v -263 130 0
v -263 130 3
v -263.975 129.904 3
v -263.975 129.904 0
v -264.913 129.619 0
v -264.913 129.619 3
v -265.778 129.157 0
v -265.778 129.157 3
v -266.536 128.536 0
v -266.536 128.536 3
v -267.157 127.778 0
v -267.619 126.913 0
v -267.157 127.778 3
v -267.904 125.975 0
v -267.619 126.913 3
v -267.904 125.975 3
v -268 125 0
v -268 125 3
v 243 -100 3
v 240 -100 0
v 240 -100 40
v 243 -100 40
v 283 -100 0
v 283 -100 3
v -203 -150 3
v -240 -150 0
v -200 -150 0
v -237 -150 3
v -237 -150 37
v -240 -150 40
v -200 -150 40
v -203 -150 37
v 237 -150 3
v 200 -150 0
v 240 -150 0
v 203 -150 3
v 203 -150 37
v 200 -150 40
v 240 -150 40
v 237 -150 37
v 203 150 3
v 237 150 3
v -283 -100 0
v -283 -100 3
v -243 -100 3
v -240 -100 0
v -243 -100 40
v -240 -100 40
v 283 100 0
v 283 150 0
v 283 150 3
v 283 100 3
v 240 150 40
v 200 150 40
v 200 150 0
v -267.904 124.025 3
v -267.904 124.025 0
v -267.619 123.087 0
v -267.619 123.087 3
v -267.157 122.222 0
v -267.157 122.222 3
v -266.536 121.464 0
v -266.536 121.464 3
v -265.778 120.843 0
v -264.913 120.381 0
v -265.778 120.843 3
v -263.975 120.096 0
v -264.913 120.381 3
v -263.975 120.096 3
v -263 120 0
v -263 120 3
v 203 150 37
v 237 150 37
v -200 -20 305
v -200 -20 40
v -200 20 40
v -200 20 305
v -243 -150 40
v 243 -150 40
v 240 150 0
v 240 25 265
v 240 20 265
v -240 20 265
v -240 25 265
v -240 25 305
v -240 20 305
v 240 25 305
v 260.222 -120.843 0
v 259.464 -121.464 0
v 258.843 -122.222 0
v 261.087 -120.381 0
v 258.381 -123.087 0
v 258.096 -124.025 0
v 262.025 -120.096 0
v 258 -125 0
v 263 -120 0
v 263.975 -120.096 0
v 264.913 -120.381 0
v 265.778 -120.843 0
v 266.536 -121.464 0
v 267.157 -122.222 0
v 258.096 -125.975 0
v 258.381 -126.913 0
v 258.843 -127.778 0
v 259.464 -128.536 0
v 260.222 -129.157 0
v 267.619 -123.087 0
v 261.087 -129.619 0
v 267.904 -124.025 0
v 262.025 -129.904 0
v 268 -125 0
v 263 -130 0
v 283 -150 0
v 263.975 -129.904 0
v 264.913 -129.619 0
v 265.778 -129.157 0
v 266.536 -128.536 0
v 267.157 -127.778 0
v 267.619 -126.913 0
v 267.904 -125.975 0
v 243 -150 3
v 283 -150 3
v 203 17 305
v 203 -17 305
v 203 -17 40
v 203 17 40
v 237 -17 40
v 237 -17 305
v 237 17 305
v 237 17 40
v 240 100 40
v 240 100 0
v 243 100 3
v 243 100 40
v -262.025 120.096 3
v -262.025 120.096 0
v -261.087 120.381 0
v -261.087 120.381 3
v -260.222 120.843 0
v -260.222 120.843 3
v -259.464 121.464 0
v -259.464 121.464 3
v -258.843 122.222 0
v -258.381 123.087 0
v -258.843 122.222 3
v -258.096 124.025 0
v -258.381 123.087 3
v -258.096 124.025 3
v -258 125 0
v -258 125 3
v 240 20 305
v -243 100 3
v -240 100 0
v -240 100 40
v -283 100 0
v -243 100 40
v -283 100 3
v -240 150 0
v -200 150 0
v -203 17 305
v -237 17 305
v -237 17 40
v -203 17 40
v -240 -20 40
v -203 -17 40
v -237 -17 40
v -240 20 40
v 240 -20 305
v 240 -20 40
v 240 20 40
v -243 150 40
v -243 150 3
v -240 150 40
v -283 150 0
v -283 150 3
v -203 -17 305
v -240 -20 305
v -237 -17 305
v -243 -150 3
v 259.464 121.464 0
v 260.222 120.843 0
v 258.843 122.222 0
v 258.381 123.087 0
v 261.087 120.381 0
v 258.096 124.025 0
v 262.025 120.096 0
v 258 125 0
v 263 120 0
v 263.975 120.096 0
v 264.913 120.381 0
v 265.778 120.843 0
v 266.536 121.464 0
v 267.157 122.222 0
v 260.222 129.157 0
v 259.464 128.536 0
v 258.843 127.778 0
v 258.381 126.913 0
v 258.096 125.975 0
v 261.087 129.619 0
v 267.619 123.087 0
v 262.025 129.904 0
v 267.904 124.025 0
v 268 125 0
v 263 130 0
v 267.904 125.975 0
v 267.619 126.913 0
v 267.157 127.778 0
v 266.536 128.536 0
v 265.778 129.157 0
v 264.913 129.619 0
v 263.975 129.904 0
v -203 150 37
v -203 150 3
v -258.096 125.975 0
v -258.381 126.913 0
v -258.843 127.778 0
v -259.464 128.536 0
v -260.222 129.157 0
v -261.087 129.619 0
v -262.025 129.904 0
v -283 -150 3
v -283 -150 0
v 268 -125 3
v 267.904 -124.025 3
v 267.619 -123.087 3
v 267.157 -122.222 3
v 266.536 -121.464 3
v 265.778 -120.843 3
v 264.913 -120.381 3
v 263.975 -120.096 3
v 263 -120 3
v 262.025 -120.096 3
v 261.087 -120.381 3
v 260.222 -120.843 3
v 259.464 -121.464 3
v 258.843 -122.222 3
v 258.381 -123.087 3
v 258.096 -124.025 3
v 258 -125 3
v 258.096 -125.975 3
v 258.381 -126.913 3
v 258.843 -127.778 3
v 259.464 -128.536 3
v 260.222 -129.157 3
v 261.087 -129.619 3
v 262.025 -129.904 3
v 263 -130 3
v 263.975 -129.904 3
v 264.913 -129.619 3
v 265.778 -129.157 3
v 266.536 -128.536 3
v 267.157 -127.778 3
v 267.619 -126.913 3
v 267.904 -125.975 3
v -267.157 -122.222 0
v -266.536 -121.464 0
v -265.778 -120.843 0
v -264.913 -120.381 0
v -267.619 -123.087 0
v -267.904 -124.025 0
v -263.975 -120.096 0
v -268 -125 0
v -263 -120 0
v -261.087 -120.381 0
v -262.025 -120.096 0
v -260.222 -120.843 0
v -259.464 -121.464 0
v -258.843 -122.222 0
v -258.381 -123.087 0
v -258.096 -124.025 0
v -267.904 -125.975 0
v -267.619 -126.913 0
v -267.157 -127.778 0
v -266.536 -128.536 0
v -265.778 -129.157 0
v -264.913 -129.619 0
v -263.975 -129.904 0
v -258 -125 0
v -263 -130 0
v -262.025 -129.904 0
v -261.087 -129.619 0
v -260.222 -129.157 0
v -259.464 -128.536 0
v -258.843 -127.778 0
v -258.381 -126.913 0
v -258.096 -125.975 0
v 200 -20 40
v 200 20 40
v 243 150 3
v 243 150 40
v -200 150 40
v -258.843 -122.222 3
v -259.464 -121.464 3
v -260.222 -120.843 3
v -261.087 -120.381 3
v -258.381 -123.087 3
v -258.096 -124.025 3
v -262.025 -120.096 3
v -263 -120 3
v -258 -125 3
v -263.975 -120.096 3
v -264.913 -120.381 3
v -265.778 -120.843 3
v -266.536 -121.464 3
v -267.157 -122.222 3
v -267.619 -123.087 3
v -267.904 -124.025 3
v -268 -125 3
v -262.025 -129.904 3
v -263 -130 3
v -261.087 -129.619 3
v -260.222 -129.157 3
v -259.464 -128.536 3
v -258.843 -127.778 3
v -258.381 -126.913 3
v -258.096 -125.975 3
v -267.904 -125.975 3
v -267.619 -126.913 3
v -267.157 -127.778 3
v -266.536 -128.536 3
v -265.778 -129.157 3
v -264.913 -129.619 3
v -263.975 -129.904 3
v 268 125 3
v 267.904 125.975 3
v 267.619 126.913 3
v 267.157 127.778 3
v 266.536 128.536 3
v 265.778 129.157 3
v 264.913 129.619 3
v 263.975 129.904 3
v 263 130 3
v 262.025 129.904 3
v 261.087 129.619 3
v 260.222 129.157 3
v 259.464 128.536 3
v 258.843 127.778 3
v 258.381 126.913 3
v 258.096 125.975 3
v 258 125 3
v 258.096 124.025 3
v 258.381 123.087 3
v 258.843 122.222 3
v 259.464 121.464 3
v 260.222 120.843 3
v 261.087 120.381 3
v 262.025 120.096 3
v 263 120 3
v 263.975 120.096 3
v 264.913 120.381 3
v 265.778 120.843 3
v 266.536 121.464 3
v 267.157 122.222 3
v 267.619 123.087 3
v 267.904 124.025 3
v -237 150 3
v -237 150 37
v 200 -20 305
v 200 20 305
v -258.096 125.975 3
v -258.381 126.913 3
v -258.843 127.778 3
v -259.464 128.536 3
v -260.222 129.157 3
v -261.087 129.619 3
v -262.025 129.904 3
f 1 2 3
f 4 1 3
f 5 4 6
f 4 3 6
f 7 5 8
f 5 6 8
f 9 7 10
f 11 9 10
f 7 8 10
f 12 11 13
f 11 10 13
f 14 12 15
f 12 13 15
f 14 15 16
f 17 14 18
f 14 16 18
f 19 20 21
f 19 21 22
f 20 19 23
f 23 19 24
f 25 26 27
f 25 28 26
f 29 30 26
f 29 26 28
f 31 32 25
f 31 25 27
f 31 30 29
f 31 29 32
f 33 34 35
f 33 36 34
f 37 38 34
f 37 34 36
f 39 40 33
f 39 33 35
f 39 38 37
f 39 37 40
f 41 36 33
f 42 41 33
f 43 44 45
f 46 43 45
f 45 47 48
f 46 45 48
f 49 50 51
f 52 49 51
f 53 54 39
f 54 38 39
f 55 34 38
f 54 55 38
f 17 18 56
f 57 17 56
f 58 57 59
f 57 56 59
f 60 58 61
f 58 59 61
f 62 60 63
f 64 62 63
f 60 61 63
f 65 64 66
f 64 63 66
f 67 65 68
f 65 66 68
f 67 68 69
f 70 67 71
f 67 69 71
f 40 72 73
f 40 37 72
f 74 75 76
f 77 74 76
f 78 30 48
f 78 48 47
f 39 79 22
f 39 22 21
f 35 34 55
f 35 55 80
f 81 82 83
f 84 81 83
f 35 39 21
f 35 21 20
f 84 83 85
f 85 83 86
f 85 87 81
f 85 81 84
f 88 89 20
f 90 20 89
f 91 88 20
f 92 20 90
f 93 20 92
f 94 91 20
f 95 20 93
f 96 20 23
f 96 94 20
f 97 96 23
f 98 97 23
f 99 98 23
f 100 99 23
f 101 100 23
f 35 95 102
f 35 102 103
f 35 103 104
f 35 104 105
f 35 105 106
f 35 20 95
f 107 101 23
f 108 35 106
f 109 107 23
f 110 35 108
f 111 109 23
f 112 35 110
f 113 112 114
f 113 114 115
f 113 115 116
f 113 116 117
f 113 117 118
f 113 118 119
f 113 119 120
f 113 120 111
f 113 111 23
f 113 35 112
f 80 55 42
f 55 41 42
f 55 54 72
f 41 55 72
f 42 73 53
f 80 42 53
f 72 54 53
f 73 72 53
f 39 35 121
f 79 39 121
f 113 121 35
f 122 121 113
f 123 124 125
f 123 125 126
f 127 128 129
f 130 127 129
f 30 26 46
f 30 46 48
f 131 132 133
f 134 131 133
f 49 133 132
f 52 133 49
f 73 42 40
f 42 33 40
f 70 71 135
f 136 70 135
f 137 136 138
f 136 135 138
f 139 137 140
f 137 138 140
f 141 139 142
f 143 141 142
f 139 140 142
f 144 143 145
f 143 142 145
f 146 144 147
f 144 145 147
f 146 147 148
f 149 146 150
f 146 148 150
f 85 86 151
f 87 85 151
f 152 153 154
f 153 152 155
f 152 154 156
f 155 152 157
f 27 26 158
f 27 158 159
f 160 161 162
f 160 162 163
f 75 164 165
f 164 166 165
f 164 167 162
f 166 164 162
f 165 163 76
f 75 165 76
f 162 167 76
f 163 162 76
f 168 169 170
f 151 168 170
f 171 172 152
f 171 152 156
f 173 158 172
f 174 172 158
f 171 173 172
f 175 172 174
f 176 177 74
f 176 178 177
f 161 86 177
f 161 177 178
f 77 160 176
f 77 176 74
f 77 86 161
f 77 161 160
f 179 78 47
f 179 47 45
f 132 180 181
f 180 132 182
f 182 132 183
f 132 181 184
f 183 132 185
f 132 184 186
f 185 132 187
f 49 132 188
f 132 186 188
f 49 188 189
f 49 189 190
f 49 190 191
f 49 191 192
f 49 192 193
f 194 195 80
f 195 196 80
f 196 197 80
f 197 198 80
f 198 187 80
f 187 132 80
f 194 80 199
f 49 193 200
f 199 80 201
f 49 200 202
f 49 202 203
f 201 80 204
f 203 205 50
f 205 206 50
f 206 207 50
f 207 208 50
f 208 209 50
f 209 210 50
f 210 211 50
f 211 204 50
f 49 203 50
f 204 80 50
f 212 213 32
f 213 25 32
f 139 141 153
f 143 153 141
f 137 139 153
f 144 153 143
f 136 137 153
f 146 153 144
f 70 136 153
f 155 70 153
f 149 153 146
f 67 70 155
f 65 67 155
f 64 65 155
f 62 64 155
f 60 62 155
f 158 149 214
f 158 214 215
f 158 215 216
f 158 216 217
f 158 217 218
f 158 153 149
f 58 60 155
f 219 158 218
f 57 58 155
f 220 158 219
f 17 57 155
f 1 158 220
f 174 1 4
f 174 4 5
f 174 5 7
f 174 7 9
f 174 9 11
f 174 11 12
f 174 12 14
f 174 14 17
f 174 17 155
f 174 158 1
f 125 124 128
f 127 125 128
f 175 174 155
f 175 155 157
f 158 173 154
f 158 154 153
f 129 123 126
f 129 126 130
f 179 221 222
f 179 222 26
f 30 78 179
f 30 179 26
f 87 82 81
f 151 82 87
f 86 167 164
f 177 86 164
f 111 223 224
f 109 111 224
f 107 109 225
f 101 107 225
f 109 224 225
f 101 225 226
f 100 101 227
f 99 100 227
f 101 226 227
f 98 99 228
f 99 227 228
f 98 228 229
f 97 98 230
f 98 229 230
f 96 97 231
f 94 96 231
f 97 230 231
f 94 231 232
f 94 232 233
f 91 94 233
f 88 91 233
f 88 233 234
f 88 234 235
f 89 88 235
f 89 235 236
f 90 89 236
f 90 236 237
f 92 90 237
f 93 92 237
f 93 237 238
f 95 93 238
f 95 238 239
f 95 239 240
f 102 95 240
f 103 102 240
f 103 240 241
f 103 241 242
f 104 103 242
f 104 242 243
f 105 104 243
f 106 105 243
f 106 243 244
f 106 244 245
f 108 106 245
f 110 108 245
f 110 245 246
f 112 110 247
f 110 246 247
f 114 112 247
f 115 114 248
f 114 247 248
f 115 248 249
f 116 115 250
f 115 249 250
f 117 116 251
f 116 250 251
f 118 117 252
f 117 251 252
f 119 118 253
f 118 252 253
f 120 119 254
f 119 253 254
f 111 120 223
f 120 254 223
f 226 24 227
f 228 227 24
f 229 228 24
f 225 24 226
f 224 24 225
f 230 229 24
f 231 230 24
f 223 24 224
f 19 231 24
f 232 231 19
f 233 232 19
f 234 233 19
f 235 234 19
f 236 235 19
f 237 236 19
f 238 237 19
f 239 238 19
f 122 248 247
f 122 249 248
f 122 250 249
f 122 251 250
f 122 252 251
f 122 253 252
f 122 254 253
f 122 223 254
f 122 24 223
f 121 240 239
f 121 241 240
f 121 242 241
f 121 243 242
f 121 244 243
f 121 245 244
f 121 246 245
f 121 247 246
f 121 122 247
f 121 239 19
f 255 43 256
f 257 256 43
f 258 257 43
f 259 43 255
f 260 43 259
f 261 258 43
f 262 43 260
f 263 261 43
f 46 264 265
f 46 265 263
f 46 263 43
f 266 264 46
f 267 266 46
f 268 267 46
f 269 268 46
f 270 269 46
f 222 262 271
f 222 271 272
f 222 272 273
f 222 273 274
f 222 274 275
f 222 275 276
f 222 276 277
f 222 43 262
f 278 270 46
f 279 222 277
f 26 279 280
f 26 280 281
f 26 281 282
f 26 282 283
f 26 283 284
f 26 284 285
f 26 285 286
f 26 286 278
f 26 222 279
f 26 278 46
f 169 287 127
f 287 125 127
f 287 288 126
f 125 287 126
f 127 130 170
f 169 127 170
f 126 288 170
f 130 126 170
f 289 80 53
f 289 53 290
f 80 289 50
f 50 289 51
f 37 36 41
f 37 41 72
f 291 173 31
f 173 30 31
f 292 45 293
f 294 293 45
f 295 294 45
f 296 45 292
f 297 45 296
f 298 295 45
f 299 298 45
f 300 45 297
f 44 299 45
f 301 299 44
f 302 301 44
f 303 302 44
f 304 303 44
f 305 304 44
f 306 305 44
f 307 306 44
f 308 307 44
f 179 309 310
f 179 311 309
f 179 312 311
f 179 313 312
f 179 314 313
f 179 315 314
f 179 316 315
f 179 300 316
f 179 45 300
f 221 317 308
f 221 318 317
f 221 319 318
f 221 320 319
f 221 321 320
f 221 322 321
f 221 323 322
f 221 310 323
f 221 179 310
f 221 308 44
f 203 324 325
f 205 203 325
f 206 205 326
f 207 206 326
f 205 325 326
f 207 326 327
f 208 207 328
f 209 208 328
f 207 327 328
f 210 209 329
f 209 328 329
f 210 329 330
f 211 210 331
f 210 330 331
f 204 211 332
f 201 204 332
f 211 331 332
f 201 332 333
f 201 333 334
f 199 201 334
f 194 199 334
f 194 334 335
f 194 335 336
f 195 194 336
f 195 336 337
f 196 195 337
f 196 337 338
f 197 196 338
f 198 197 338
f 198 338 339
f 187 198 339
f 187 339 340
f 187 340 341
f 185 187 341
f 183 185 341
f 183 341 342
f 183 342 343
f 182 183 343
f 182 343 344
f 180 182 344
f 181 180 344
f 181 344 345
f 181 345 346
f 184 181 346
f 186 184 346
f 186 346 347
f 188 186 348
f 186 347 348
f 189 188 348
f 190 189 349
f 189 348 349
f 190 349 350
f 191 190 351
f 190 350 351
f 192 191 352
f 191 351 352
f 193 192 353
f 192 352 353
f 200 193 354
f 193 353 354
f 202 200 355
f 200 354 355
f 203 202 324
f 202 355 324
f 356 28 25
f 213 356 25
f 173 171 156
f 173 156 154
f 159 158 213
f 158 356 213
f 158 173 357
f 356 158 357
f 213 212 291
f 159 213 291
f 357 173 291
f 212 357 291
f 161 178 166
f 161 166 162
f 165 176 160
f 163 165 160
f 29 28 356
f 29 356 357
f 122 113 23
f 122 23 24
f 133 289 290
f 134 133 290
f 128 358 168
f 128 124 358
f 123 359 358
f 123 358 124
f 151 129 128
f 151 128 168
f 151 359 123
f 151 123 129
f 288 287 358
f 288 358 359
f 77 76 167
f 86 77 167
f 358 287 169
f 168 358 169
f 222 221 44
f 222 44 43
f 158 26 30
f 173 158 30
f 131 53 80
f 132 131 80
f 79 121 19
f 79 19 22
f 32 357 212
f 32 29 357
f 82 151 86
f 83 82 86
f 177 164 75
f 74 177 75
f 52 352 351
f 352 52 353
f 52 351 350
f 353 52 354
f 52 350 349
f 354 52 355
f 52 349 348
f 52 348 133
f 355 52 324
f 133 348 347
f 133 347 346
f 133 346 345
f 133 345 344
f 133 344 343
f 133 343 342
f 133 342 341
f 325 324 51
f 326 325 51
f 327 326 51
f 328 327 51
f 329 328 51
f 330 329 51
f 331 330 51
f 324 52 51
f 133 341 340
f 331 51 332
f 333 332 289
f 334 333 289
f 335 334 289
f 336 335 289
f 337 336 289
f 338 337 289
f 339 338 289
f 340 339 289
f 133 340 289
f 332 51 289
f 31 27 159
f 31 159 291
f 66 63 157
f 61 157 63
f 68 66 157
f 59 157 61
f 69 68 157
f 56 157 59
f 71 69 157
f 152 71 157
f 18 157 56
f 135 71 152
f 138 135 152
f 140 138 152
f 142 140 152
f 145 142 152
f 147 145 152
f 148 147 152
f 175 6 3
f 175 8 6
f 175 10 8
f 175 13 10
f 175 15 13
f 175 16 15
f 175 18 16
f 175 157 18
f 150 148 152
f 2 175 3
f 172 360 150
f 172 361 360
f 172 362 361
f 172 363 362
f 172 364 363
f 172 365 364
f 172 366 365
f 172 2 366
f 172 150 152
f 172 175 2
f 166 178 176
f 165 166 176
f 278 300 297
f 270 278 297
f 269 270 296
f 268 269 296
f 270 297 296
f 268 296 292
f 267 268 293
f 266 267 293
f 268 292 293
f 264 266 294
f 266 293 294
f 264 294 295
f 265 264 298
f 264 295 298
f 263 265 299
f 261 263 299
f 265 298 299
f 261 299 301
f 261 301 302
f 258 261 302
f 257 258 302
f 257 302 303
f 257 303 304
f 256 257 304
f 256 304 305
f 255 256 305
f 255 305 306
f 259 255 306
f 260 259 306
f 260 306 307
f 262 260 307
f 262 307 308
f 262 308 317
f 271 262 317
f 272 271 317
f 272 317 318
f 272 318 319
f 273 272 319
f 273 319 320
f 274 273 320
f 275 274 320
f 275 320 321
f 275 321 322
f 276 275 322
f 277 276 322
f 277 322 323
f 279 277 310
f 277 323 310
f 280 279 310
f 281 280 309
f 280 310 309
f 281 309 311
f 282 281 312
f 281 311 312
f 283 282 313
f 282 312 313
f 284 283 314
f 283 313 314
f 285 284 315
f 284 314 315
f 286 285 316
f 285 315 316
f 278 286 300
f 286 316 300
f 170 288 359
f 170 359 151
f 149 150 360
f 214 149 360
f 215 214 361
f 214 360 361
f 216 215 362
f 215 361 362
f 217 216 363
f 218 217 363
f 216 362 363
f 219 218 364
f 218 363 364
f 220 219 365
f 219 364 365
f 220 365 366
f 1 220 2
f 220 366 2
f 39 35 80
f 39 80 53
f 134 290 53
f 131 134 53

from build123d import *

# Parameters (mm, degrees)
F0_W      = 40
F0_H      = 40
F0_W_2    = 34
F0_H_2    = 34
F1_DEPTH  = 150
F2_W      = 34
F2_H      = 34
F3_DEPTH  = 265
F2_W_2    = 40
F2_H_2    = 40
F5_DEPTH  = 50
F8_DEPTH  = 50
F9_W      = 440
F9_H      = 40
F9_W_2    = 40
F10_DEPTH = 5
F11_R     = 5
F12_DEPTH = 25


with BuildPart() as f1:
    # F0 (on Front) → F1 (new body, symmetric)
    with BuildSketch(Plane.XZ):
        with Locations((-220, 20)):
            Rectangle(F0_W, F0_H)
        with Locations((-220, 20)):
            Rectangle(F0_W_2, F0_H_2, mode=Mode.SUBTRACT)
    extrude(amount=F1_DEPTH, both=True)


with BuildPart() as f1b:
    # F0 (on Front) → F1, piece 2 (new body, symmetric)
    with BuildSketch(Plane.XZ):
        with Locations((220, 20)):
            Rectangle(F0_W, F0_H)
        with Locations((220, 20)):
            Rectangle(F0_W_2, F0_H_2, mode=Mode.SUBTRACT)
    extrude(amount=F1_DEPTH, both=True)


with BuildPart() as f3:
    # F2 (on face) → F3 (new body)
    with BuildSketch(Plane.XY.offset(40)):
        Polygon((-240, 20), (-240, 0), (-240, -20), (-200, -20), (-200, 20), align=None)
        with Locations((-220, 0)):
            Rectangle(F2_W, F2_H, mode=Mode.SUBTRACT)
    extrude(amount=F3_DEPTH)


with BuildPart() as f3b:
    # F2 (on face) → F3, piece 2 (new body)
    with BuildSketch(Plane.XY.offset(40)):
        with Locations((220, 0)):
            Rectangle(F2_W_2, F2_H_2)
        with Locations((220, 0)):
            Rectangle(F2_W, F2_H, mode=Mode.SUBTRACT)
    extrude(amount=F3_DEPTH)


with BuildPart() as f5:
    # F4 (on face) → F5 (new body)
    with BuildSketch(Plane.XZ.offset(150)):
        Polygon((-240, 0), (-240, 40), (-243, 40), (-243, 3), (-283, 3), (-283, 0), align=None)
    extrude(amount=-F5_DEPTH)


with BuildPart() as f5b:
    # F4 (on face) → F5, piece 2 (new body)
    with BuildSketch(Plane.XZ.offset(150)):
        Polygon((283, 3), (243, 3), (243, 40), (240, 40), (240, 0), (283, 0), align=None)
    extrude(amount=-F5_DEPTH)


with BuildPart() as f6_1:
    # F6: instance of F5b
    add(f5b.part.mirror(Plane.XZ))


with BuildPart() as f8:
    # F7 (on face) → F8 (new body)
    with BuildSketch(Plane(origin=(0, 150, 0), x_dir=(-1, 0, 0), z_dir=(0, 1, 0))):
        Polygon((240, 0), (283, 0), (283, 3), (243, 3), (243, 40), (240, 40), align=None)
    extrude(amount=-F8_DEPTH)


with BuildPart() as f10:
    # F9 (on face) → F10 (new body)
    with BuildSketch(Plane(origin=(0, 20, 0), x_dir=(-1, 0, 0), z_dir=(0, 1, 0))):
        with Locations((-20, 285)):
            Rectangle(F9_W, F9_H)
        with Locations((220, 285)):
            Rectangle(F9_W_2, F9_H)
    extrude(amount=F10_DEPTH)


with BuildPart() as f12_tool:
    # F11 (on face) → F12 (new body)
    with BuildSketch(Plane.XY.offset(3)):
        with BuildLine():
            ThreePointArc((-258, 125), (-259.4644660941, 128.5355339059), (-263, 130))
            Line((-263, 130), (-263, 125))
            Line((-263, 125), (-263, 120))
            ThreePointArc((-263, 120), (-259.4644660941, 121.4644660941), (-258, 125))
        make_face()
        with BuildLine():
            Line((-263, 120), (-263, 125))
            Line((-263, 125), (-268, 125))
            ThreePointArc((-268, 125), (-266.5355339059, 121.4644660941), (-263, 120))
        make_face()
        with BuildLine():
            Line((-263, 125), (-263, 130))
            ThreePointArc((-263, 130), (-266.5355339059, 128.5355339059), (-268, 125))
            Line((-268, 125), (-263, 125))
        make_face()
        with Locations((-263, -125)):
            Circle(F11_R)
        with Locations((263, -125)):
            Circle(F11_R)
        with Locations((263, 125)):
            Circle(F11_R)
    extrude(amount=-F12_DEPTH)


with BuildPart() as f5_1:
    add(f5.part)

    # F12: cut by f12_tool
    add(f12_tool.part, mode=Mode.SUBTRACT)


with BuildPart() as f5b_1:
    add(f5b.part)

    # F12: cut by f12_tool
    add(f12_tool.part, mode=Mode.SUBTRACT)


with BuildPart() as f6_1_1:
    add(f6_1.part)

    # F12: cut by f12_tool
    add(f12_tool.part, mode=Mode.SUBTRACT)


with BuildPart() as f8_1:
    add(f8.part)

    # F12: cut by f12_tool
    add(f12_tool.part, mode=Mode.SUBTRACT)


solid = Compound([f1.part, f1b.part, f3.part, f3b.part, f10.part, f5_1.part, f5b_1.part, f6_1_1.part, f8_1.part])
